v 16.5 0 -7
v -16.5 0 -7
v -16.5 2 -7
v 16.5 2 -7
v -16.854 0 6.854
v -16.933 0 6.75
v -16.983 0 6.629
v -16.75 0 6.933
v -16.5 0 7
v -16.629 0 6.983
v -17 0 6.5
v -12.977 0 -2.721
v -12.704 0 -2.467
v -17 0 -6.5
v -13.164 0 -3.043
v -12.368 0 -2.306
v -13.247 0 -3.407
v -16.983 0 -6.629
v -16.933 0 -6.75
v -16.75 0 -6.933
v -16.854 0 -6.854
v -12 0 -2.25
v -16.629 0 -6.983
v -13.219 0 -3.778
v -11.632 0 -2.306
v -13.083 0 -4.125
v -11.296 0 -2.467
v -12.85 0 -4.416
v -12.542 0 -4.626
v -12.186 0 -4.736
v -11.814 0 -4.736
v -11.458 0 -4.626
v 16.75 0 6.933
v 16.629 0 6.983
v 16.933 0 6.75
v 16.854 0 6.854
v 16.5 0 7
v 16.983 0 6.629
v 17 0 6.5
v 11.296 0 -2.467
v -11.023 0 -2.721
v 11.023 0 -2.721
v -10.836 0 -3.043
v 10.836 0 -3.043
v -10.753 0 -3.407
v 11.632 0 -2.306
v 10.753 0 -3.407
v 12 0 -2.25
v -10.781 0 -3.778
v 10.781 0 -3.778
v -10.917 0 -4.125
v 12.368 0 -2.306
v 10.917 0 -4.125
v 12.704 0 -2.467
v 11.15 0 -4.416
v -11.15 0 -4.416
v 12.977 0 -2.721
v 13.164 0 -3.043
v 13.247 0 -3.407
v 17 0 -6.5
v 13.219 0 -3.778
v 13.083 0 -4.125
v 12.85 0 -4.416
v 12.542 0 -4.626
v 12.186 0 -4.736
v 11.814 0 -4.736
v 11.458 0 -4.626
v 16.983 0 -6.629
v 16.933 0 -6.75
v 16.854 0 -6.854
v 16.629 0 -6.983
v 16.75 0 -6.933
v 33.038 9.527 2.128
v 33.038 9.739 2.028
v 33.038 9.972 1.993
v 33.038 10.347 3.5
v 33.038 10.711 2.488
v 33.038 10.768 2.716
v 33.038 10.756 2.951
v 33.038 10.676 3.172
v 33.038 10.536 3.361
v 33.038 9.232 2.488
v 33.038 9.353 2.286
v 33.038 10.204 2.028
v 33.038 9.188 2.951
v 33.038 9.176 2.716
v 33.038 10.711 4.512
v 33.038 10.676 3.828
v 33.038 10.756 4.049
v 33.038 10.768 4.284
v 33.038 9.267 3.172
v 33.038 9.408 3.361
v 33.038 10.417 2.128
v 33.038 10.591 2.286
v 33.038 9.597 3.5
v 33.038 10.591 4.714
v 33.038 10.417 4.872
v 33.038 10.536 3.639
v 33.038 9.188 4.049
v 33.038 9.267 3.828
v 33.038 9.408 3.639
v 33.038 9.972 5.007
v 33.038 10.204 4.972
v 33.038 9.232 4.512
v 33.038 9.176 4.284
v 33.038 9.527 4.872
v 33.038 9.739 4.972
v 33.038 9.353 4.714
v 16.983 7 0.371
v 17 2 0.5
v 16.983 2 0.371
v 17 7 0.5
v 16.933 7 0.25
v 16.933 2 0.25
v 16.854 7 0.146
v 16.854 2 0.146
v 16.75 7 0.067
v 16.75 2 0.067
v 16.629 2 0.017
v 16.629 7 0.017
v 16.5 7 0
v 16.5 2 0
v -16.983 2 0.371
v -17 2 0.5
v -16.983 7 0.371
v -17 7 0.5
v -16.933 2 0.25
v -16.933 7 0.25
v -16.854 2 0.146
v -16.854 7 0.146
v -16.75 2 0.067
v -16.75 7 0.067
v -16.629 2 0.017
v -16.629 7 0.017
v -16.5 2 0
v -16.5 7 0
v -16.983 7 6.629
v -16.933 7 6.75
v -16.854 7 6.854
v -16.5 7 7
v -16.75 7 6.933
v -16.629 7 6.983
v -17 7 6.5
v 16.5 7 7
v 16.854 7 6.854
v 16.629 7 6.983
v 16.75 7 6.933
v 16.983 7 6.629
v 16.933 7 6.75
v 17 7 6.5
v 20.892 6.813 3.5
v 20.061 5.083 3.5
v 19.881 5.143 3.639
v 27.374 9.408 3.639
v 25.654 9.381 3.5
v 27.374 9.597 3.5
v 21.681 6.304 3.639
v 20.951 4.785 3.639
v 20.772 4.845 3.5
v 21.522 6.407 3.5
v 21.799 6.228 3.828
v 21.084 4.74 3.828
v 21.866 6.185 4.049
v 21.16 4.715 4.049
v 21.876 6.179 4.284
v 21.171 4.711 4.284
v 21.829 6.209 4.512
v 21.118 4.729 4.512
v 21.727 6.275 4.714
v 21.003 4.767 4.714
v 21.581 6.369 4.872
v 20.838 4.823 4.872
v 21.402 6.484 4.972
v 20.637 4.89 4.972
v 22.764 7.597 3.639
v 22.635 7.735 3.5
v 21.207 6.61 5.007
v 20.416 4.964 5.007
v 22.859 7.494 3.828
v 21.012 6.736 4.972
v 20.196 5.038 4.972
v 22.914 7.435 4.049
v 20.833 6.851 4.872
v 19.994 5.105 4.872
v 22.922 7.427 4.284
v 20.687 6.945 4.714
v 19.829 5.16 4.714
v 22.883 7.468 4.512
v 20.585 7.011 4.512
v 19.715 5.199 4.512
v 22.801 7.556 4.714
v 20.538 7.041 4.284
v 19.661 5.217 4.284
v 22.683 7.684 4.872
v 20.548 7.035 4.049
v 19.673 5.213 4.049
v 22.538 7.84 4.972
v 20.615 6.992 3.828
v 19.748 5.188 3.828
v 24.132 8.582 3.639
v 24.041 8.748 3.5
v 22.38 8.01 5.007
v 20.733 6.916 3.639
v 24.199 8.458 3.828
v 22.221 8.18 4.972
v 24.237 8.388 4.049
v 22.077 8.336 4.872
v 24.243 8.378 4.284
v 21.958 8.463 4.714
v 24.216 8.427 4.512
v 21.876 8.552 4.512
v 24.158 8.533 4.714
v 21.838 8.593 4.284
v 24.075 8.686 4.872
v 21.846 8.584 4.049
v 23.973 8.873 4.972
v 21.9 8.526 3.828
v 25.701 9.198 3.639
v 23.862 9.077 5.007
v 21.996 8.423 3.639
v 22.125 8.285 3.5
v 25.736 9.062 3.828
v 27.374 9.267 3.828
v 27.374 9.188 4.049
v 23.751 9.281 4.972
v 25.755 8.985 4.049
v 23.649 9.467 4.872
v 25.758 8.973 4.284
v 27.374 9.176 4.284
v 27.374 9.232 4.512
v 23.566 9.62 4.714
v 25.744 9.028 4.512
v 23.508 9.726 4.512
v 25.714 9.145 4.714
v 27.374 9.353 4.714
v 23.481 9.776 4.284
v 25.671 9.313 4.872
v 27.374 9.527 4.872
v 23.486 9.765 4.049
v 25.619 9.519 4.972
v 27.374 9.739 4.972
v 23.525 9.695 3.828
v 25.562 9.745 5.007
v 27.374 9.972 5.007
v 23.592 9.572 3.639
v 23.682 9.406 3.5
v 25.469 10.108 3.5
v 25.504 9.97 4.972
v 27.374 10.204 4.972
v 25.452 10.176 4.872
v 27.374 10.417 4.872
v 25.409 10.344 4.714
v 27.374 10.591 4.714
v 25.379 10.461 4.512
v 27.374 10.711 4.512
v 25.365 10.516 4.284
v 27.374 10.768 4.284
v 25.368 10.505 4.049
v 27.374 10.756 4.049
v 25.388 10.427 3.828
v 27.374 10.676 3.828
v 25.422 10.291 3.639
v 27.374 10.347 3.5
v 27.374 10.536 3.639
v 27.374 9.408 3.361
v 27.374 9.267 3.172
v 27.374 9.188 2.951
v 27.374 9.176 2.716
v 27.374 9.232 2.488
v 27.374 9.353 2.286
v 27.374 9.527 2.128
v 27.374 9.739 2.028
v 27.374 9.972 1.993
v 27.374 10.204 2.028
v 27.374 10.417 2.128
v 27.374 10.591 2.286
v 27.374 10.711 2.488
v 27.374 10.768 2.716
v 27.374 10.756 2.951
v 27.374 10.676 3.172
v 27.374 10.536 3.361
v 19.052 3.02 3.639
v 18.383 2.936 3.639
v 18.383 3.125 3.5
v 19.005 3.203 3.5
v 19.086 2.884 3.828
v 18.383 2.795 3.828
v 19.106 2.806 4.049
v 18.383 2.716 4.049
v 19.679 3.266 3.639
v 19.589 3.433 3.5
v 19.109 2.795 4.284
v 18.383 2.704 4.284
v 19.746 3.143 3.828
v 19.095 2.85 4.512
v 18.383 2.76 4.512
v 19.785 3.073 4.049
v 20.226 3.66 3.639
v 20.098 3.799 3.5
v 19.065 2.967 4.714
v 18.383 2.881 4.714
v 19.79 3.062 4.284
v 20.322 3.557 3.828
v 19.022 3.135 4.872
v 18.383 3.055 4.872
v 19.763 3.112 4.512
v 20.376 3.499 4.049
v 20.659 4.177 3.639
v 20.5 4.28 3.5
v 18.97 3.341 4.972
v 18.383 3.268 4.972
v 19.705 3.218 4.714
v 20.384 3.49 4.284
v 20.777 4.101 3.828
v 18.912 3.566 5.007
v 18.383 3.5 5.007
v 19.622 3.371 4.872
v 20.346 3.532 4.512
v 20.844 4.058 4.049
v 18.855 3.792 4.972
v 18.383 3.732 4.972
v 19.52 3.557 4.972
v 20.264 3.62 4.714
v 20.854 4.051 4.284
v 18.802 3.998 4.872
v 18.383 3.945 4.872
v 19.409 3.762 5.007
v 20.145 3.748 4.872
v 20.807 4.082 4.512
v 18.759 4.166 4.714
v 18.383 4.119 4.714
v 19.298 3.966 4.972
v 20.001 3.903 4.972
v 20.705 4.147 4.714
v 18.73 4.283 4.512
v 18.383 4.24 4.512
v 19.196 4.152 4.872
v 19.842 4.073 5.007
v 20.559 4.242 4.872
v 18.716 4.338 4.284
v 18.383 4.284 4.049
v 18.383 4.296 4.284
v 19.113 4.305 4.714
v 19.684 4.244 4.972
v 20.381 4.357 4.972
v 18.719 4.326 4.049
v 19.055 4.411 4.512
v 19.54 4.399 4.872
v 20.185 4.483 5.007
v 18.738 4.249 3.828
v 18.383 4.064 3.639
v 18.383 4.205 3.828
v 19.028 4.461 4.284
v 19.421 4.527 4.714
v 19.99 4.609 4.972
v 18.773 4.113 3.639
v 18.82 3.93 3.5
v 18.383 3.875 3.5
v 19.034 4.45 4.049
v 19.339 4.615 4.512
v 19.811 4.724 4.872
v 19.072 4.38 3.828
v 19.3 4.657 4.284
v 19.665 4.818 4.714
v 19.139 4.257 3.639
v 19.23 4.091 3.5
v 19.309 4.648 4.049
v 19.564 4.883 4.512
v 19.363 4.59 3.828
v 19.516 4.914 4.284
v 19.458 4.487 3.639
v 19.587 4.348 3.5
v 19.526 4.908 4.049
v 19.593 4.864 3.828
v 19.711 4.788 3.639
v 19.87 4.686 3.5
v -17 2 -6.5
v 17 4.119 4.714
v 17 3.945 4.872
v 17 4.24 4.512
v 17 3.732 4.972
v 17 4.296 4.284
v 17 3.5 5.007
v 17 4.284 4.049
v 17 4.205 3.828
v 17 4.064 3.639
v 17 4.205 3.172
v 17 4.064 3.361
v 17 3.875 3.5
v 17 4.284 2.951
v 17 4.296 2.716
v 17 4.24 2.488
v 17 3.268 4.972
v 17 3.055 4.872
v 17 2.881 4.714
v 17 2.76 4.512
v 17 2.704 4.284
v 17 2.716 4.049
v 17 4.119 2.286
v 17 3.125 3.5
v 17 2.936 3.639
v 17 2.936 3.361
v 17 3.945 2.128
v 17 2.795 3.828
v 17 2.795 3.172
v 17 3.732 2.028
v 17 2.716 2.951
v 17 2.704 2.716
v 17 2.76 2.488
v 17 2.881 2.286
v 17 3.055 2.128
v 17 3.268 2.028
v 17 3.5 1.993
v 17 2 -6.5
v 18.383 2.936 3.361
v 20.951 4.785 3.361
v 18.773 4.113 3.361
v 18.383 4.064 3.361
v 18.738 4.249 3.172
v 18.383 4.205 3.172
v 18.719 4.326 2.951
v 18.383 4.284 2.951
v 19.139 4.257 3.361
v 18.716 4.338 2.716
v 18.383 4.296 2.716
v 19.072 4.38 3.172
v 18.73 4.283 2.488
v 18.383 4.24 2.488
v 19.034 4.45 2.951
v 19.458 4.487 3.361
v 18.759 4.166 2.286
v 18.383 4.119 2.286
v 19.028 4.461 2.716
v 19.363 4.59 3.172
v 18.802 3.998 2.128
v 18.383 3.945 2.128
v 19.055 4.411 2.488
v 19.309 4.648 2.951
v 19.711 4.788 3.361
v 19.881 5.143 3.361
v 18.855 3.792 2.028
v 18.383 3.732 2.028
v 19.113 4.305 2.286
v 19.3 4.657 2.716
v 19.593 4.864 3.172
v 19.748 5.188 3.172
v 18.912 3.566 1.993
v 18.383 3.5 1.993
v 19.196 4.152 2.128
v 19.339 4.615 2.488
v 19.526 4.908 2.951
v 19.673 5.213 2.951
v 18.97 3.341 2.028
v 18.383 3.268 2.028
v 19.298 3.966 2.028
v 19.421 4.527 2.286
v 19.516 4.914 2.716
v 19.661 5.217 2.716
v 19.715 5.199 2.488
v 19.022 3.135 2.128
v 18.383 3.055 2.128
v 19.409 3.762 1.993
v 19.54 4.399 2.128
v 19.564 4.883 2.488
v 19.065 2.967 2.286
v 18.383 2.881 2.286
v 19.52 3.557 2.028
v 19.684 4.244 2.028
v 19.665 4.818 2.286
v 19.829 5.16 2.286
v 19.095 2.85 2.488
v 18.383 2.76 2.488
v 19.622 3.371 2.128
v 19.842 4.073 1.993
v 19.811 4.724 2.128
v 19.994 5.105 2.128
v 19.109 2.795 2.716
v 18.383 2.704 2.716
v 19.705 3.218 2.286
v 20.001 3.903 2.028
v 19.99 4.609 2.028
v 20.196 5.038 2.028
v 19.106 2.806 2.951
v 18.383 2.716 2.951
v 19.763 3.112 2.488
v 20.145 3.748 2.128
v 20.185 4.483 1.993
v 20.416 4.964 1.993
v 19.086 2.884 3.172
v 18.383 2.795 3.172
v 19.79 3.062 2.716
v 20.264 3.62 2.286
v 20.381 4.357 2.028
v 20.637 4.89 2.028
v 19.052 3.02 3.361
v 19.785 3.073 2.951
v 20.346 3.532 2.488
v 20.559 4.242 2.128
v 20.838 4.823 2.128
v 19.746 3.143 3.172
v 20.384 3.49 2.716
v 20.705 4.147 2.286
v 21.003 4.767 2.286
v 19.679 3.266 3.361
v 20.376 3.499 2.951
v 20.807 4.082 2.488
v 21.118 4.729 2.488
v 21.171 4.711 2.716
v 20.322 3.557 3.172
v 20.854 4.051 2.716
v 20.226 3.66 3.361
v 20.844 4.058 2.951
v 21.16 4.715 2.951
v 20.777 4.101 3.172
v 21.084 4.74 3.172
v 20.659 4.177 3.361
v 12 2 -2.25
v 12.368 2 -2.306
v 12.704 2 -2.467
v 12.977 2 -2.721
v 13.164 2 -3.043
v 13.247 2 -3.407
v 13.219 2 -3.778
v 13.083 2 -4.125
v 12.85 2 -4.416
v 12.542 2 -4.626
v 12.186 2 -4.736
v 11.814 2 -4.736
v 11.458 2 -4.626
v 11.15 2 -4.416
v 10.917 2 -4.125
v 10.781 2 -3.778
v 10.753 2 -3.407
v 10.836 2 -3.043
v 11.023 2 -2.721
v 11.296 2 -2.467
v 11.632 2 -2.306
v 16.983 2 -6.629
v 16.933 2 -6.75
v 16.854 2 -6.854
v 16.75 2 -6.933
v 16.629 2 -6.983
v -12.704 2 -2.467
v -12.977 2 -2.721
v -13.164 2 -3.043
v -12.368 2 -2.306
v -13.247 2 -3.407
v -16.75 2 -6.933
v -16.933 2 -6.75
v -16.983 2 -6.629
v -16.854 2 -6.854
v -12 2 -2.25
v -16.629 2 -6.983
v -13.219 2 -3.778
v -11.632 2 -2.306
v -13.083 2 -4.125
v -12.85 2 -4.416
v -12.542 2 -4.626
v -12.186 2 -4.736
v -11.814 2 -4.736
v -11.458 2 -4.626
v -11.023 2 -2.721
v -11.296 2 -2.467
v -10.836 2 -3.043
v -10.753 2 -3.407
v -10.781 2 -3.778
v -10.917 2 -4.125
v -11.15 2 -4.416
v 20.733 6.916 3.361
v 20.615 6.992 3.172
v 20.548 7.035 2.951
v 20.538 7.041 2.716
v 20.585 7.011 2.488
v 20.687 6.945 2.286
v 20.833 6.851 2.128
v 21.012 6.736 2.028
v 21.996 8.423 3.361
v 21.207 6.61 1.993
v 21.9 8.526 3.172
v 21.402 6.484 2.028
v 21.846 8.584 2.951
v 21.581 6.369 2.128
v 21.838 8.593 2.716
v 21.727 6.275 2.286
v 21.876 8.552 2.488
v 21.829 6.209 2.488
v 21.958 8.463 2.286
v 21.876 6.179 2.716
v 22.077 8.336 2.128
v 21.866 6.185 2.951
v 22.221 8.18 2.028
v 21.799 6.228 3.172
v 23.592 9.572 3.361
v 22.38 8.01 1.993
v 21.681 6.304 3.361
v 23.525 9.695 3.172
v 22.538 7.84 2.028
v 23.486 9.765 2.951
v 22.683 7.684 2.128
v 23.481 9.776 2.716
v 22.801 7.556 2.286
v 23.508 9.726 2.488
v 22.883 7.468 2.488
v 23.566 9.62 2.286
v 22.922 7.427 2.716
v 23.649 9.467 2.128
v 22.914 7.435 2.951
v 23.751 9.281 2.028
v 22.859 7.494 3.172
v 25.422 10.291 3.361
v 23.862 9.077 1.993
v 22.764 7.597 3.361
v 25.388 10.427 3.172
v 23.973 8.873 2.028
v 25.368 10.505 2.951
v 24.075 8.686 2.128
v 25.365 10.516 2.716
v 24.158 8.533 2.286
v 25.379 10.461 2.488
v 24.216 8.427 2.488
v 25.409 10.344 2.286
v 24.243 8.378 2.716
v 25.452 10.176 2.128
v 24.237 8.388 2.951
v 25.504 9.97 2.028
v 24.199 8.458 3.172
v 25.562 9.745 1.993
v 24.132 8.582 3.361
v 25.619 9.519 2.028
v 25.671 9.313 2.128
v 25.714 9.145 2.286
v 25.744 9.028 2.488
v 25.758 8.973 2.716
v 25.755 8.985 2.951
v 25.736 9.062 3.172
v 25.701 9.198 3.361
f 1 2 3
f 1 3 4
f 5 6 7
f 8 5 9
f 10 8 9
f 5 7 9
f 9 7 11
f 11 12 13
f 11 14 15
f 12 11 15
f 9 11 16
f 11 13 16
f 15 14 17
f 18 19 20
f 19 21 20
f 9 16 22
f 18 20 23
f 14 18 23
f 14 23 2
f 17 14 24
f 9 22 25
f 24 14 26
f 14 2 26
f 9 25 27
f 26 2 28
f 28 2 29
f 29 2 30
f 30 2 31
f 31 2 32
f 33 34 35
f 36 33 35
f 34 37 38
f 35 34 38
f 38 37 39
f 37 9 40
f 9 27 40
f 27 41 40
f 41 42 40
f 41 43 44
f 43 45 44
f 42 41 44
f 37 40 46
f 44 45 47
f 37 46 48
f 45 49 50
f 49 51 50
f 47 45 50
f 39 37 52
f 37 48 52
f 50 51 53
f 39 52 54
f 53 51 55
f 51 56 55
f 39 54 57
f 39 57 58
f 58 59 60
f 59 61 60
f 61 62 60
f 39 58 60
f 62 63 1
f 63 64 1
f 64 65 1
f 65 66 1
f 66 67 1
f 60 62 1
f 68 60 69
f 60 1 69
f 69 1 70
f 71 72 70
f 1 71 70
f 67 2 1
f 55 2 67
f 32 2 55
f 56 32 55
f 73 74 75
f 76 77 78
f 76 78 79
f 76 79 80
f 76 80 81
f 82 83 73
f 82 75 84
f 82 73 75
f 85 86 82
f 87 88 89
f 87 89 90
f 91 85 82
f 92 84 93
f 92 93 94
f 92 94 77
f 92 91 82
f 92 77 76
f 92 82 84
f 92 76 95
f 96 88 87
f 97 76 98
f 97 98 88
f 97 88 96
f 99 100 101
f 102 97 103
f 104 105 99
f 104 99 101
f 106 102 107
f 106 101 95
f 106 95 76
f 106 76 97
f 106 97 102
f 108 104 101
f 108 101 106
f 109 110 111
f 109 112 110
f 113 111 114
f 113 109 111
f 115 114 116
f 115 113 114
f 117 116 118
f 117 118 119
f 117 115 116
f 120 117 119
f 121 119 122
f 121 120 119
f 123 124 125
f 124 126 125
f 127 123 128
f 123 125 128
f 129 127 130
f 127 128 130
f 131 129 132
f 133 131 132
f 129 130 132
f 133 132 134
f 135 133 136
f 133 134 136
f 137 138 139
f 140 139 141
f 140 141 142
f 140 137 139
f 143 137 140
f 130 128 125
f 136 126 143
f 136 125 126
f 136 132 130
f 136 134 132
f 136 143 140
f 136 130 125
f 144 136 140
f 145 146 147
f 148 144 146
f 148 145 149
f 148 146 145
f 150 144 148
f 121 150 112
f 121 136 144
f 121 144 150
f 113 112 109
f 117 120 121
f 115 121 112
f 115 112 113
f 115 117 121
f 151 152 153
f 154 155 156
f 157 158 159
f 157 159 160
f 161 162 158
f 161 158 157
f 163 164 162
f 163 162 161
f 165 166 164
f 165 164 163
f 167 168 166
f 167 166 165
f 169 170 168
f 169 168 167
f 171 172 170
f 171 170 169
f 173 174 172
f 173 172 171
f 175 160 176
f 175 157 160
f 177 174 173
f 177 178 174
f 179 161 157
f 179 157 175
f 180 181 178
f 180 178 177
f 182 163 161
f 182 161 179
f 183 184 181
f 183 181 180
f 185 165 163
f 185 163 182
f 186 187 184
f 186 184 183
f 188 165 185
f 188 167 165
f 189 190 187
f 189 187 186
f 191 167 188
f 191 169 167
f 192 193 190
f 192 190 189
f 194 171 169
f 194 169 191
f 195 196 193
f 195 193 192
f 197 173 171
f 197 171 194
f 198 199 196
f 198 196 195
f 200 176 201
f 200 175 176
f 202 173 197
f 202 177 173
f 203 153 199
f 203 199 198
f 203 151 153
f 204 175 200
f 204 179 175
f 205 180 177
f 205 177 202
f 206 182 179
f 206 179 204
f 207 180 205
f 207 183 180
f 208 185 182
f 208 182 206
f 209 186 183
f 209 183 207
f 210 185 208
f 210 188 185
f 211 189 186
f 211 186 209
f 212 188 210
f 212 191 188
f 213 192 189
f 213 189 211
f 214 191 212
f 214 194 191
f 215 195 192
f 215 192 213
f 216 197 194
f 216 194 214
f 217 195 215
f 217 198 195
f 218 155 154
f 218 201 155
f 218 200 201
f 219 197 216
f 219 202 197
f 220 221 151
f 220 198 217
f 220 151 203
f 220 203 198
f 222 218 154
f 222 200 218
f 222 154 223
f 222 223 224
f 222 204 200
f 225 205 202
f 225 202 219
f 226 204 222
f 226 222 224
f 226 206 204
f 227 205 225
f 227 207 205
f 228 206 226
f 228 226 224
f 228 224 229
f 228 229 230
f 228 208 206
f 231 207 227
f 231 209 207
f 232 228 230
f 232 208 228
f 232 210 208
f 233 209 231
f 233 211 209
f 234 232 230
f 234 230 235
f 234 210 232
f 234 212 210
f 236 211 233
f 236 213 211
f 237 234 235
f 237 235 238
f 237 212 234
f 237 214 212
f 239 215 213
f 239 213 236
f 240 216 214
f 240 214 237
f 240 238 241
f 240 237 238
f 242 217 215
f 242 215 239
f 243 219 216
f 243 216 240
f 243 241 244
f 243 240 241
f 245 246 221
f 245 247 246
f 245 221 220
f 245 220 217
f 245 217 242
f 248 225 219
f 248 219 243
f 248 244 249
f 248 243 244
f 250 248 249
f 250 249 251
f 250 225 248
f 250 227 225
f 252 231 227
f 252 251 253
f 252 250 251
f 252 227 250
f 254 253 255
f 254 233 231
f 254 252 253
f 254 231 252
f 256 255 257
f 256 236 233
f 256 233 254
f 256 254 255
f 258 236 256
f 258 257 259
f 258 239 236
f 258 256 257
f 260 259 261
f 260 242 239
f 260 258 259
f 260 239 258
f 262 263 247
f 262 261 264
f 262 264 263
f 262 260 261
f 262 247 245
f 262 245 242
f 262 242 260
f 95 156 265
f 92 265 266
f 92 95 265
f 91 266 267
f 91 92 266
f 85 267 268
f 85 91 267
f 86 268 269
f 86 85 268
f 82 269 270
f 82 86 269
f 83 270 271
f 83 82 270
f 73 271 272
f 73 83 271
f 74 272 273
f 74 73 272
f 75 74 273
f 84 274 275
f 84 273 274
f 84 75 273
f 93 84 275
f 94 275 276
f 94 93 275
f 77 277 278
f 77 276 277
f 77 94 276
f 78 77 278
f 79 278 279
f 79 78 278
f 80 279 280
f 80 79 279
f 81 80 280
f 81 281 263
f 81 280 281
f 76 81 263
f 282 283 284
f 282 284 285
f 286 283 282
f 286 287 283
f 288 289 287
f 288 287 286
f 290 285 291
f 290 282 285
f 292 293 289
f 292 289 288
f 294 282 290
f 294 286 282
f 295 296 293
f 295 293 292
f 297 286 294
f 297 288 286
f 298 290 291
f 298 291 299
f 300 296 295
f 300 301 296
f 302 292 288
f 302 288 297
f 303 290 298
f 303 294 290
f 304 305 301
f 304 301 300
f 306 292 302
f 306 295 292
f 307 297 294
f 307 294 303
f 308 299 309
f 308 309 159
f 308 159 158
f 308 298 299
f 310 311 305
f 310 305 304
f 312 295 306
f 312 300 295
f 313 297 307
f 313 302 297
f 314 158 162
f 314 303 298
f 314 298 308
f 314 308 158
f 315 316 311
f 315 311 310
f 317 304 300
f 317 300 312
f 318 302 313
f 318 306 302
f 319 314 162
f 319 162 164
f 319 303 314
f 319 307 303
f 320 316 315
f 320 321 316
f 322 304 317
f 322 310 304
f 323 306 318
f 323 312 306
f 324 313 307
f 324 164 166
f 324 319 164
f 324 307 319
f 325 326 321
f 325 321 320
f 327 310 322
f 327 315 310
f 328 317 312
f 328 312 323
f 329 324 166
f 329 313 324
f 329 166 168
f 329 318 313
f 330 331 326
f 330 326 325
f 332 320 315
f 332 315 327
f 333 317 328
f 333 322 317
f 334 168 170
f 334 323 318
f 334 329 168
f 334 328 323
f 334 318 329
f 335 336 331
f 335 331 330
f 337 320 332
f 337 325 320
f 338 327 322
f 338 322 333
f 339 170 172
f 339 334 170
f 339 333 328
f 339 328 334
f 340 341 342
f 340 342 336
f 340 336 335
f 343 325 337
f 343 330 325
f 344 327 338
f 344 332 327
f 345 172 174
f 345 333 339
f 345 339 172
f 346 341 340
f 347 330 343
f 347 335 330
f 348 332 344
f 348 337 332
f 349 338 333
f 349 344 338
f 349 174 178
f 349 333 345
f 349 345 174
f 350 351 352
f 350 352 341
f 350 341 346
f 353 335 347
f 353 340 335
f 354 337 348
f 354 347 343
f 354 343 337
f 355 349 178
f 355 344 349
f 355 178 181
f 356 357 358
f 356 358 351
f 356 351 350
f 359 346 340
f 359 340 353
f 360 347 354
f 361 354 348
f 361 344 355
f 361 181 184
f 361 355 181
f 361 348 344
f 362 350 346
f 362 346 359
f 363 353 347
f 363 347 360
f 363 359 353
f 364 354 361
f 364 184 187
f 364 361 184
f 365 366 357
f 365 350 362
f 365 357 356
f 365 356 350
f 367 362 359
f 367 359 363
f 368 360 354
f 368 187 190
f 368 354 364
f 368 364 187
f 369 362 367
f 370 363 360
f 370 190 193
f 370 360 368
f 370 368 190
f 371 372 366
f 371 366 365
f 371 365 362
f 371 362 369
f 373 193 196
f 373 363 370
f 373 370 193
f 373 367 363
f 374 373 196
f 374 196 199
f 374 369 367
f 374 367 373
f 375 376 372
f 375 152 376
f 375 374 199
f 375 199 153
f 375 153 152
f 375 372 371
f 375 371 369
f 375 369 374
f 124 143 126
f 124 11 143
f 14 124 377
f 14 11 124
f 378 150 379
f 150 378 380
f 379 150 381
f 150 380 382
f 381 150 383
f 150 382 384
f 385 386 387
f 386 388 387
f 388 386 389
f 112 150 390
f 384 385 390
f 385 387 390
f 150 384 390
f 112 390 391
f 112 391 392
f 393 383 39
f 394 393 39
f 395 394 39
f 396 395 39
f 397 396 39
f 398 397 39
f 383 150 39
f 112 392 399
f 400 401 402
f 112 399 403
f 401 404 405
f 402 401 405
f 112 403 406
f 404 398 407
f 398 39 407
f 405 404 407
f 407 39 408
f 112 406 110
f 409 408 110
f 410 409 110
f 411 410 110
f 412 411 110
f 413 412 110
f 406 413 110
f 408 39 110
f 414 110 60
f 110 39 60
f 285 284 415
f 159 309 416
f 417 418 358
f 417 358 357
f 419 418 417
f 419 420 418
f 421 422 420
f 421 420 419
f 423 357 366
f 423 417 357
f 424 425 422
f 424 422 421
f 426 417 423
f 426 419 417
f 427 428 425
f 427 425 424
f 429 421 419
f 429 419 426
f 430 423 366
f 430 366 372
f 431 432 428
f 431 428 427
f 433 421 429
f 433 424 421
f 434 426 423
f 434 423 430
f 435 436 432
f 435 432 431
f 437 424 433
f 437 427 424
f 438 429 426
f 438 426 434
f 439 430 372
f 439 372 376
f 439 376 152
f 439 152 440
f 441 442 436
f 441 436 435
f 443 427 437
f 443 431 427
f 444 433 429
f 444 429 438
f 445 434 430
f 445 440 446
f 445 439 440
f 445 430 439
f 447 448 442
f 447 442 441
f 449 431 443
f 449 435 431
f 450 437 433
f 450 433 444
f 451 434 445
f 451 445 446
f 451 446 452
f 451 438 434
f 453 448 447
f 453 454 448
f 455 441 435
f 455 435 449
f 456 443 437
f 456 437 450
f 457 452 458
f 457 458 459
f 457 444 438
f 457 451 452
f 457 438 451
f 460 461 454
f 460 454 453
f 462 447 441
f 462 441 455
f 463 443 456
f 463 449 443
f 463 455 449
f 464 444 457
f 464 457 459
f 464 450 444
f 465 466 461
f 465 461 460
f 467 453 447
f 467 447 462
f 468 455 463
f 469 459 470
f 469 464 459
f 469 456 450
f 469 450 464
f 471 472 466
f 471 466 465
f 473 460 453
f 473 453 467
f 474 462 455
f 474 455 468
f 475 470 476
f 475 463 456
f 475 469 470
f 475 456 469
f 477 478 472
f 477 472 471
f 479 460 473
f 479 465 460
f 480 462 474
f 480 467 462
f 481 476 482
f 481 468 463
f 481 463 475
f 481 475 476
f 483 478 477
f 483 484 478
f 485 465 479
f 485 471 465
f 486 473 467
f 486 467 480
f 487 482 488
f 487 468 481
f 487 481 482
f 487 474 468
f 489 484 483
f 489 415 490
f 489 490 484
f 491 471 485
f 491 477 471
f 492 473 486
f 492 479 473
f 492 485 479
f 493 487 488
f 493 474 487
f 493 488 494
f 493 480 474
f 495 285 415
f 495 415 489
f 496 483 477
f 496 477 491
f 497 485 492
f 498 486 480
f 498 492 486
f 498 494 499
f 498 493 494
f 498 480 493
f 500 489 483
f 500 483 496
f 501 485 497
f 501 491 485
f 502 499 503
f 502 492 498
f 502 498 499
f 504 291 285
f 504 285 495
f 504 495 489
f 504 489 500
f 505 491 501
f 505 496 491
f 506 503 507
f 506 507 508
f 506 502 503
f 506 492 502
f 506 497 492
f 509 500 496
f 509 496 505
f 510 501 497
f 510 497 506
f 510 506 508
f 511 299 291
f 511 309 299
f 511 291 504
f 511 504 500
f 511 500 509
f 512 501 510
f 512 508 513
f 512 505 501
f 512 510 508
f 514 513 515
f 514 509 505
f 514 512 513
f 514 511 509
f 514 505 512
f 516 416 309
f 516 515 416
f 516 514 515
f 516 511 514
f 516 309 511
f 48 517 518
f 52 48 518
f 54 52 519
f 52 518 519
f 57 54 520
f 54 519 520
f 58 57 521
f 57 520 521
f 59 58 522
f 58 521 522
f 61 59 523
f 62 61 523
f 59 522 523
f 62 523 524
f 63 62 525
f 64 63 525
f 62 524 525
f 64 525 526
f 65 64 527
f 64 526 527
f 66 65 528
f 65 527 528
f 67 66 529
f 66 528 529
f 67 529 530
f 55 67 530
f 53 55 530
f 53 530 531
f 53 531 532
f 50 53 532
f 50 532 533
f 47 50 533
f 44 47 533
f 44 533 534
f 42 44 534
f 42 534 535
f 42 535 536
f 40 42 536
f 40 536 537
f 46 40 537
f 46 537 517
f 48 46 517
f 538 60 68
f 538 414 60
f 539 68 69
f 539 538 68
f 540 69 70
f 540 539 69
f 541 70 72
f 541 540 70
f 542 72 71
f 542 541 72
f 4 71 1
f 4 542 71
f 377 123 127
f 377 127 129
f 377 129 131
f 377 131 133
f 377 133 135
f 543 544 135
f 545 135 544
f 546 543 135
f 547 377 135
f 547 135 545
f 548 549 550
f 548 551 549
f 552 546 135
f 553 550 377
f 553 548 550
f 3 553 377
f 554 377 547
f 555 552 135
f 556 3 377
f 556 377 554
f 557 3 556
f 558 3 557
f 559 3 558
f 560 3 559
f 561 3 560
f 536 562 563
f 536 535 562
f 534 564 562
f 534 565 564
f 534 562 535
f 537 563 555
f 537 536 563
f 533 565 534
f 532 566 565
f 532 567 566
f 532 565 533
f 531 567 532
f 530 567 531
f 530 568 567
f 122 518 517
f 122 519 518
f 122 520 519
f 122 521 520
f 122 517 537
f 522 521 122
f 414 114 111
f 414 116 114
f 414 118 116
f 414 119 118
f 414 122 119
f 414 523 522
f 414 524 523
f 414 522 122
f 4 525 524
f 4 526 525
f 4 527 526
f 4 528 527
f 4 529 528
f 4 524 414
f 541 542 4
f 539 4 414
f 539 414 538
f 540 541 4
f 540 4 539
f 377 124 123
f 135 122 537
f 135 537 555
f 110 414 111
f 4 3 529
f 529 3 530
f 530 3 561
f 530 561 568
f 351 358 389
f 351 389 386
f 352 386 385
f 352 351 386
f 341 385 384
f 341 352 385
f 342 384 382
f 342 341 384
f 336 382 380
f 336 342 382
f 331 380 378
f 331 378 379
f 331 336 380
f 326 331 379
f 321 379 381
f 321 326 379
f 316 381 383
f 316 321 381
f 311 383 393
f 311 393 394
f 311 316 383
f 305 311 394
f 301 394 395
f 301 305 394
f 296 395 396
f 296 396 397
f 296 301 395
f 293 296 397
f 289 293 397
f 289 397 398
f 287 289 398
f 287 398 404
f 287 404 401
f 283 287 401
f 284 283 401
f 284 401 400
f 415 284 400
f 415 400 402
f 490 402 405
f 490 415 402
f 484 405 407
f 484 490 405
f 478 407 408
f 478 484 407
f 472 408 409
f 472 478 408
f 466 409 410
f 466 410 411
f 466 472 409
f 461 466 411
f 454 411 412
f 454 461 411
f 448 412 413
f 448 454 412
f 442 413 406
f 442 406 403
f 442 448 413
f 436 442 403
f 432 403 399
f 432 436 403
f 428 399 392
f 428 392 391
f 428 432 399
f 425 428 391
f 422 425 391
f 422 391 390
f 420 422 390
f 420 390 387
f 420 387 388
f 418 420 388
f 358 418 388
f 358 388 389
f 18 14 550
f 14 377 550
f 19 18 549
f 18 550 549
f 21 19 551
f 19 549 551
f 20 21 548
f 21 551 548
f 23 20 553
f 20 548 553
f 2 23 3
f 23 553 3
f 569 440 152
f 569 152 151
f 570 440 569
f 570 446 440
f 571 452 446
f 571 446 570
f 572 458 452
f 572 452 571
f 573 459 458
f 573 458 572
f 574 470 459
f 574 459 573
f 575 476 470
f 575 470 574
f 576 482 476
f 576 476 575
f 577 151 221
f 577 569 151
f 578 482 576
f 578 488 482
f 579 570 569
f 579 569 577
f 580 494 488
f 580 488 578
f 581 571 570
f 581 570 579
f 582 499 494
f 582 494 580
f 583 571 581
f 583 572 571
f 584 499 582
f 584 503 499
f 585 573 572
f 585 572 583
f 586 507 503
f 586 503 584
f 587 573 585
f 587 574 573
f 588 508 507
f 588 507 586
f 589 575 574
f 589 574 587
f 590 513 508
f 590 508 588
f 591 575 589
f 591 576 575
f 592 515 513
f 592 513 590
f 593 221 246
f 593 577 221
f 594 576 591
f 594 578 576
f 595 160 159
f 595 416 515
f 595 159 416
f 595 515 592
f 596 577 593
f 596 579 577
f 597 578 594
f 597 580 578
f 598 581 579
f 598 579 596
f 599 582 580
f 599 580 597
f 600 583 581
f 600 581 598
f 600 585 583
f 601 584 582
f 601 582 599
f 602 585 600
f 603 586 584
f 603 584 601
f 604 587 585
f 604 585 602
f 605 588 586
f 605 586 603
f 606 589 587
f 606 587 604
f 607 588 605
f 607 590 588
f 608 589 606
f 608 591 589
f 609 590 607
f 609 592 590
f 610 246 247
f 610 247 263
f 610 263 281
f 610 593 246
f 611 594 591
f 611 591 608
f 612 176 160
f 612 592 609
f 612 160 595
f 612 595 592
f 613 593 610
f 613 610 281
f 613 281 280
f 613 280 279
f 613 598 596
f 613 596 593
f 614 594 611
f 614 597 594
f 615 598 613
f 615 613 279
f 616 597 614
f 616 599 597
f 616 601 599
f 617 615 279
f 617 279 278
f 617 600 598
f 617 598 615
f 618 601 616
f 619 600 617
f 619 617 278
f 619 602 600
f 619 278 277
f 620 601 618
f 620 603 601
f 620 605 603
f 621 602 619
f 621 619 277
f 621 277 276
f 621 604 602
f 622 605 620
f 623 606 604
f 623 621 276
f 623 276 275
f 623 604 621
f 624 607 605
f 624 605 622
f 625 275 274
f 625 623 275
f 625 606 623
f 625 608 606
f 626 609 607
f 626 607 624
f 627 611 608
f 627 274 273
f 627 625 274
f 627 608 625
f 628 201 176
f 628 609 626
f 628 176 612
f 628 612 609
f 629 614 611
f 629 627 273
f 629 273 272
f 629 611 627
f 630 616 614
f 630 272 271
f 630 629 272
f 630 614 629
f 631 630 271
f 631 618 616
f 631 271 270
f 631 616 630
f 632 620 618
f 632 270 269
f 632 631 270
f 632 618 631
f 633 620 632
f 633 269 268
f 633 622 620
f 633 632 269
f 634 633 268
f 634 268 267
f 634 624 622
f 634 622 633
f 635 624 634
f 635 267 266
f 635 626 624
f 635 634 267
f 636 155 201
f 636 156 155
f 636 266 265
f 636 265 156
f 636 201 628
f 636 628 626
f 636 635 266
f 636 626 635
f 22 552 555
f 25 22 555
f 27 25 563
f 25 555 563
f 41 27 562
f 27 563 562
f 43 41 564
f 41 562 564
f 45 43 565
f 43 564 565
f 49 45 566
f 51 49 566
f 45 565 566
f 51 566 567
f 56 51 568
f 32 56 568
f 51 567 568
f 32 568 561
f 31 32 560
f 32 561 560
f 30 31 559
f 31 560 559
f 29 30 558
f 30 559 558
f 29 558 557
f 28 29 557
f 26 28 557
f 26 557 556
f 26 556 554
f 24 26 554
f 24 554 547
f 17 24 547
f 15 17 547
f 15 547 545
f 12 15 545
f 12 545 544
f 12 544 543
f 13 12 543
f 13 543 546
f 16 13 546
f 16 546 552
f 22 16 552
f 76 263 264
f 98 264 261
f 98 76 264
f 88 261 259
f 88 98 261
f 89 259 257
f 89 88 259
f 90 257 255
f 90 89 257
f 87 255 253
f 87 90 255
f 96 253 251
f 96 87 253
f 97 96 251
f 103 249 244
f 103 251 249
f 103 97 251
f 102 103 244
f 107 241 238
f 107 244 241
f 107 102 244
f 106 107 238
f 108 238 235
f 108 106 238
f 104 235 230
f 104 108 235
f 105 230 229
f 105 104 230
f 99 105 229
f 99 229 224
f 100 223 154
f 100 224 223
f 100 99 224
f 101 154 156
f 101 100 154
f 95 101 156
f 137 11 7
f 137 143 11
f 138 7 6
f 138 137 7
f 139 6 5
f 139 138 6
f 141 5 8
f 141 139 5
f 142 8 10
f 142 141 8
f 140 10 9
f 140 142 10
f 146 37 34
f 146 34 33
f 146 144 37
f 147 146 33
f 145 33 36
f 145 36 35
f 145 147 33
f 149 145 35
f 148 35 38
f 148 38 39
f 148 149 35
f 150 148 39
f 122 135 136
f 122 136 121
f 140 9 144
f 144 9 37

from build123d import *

# Parameters (mm, degrees)
SKETCH1_W           = 34
SKETCH1_H           = 14
BOSS_EXTRUDE1_DEPTH = 2
SKETCH2_W           = 34
SKETCH2_H           = 7
BOSS_EXTRUDE2_DEPTH = 5
FILLET1_R           = 0.5
CUT_EXTRUDE1_REACH  = 21.053
SKETCH3_R           = 1.25


with BuildPart() as part:
    # Sketch1 → Boss-Extrude1 (new body)
    with BuildSketch(Plane(origin=(0, 0, 0), x_dir=(1, 0, 0), z_dir=(0, 1, 0))):
        Rectangle(SKETCH1_W, SKETCH1_H)
    extrude(amount=BOSS_EXTRUDE1_DEPTH)

    # Sketch2 → Boss-Extrude2 (add)
    with BuildSketch(Plane(origin=(0, 2, 0), x_dir=(1, 0, 0), z_dir=(0, 1, 0))):
        with Locations((0, -3.5)):
            Rectangle(SKETCH2_W, SKETCH2_H)
    extrude(amount=BOSS_EXTRUDE2_DEPTH)

    # Fillet1
    fillet1_edges = [part.edges().sort_by_distance(p)[0] for p in [
        (17, 4.5, 0),
        (-17, 4.5, 0),
        (17, 3.5, 7),
        (-17, 3.5, 7),
        (-17, 1, -7),
        (17, 1, -7),
    ]]
    fillet(fillet1_edges, radius=FILLET1_R)

    # Sketch3 → Cut-Extrude1 (cut, up to next)
    with BuildSketch(Plane(origin=(0, 2, 0), x_dir=(1, 0, 0), z_dir=(0, 1, 0)), mode=Mode.PRIVATE) as cut_extrude1_sk1:
        with Locations(Location((12, 3.5, 0), (0, 0, 270))):
            Circle(SKETCH3_R)
    cut_extrude1_tool1 = extrude(cut_extrude1_sk1.sketch, amount=-CUT_EXTRUDE1_REACH, mode=Mode.PRIVATE) & part.part
    # Sketch3 → Cut-Extrude1 (cut, up to next)
    with BuildSketch(Plane(origin=(0, 2, 0), x_dir=(1, 0, 0), z_dir=(0, 1, 0)), mode=Mode.PRIVATE) as cut_extrude1_sk2:
        with Locations(Location((-12, 3.5, 0), (0, 0, 270))):
            Circle(SKETCH3_R)
    cut_extrude1_tool2 = extrude(cut_extrude1_sk2.sketch, amount=-CUT_EXTRUDE1_REACH, mode=Mode.PRIVATE) & part.part
    add(cut_extrude1_tool1.solids().sort_by_distance((12, 2, -3.5))[0], mode=Mode.SUBTRACT)
    add(cut_extrude1_tool2.solids().sort_by_distance((-12, 2, -3.5))[0], mode=Mode.SUBTRACT)

    # Sweep1: sweep along a path in Sketch5
    with BuildLine(Plane.XY.offset(3.5)) as sweep1_path:
        Line((17, 3.5), (18.382578008, 3.5))
        ThreePointArc((18.382578008, 3.5), (19.635477623, 3.904030935), (20.416306226, 4.963891838))
        ThreePointArc((20.416306226, 4.963891838), (23.087486641, 8.589629512), (27.373601284, 9.971801625))
        Line((27.373601284, 9.971801625), (33.038157501, 9.971801625))
    # Sketch4 → Sweep1 (sweep)
    with BuildSketch(Plane(origin=(17, 0, 0), x_dir=(0, 0, -1), z_dir=(1, 0, 0))):
        with BuildLine():
            ThreePointArc((-3.5, 3.874862619), (-5.006737587, 3.5), (-3.5, 3.125137381))
            ThreePointArc((-3.5, 3.125137381), (-1.993262413, 3.5), (-3.5, 3.874862619))
        make_face()
    sweep(path=sweep1_path.line)


solid = part.part
